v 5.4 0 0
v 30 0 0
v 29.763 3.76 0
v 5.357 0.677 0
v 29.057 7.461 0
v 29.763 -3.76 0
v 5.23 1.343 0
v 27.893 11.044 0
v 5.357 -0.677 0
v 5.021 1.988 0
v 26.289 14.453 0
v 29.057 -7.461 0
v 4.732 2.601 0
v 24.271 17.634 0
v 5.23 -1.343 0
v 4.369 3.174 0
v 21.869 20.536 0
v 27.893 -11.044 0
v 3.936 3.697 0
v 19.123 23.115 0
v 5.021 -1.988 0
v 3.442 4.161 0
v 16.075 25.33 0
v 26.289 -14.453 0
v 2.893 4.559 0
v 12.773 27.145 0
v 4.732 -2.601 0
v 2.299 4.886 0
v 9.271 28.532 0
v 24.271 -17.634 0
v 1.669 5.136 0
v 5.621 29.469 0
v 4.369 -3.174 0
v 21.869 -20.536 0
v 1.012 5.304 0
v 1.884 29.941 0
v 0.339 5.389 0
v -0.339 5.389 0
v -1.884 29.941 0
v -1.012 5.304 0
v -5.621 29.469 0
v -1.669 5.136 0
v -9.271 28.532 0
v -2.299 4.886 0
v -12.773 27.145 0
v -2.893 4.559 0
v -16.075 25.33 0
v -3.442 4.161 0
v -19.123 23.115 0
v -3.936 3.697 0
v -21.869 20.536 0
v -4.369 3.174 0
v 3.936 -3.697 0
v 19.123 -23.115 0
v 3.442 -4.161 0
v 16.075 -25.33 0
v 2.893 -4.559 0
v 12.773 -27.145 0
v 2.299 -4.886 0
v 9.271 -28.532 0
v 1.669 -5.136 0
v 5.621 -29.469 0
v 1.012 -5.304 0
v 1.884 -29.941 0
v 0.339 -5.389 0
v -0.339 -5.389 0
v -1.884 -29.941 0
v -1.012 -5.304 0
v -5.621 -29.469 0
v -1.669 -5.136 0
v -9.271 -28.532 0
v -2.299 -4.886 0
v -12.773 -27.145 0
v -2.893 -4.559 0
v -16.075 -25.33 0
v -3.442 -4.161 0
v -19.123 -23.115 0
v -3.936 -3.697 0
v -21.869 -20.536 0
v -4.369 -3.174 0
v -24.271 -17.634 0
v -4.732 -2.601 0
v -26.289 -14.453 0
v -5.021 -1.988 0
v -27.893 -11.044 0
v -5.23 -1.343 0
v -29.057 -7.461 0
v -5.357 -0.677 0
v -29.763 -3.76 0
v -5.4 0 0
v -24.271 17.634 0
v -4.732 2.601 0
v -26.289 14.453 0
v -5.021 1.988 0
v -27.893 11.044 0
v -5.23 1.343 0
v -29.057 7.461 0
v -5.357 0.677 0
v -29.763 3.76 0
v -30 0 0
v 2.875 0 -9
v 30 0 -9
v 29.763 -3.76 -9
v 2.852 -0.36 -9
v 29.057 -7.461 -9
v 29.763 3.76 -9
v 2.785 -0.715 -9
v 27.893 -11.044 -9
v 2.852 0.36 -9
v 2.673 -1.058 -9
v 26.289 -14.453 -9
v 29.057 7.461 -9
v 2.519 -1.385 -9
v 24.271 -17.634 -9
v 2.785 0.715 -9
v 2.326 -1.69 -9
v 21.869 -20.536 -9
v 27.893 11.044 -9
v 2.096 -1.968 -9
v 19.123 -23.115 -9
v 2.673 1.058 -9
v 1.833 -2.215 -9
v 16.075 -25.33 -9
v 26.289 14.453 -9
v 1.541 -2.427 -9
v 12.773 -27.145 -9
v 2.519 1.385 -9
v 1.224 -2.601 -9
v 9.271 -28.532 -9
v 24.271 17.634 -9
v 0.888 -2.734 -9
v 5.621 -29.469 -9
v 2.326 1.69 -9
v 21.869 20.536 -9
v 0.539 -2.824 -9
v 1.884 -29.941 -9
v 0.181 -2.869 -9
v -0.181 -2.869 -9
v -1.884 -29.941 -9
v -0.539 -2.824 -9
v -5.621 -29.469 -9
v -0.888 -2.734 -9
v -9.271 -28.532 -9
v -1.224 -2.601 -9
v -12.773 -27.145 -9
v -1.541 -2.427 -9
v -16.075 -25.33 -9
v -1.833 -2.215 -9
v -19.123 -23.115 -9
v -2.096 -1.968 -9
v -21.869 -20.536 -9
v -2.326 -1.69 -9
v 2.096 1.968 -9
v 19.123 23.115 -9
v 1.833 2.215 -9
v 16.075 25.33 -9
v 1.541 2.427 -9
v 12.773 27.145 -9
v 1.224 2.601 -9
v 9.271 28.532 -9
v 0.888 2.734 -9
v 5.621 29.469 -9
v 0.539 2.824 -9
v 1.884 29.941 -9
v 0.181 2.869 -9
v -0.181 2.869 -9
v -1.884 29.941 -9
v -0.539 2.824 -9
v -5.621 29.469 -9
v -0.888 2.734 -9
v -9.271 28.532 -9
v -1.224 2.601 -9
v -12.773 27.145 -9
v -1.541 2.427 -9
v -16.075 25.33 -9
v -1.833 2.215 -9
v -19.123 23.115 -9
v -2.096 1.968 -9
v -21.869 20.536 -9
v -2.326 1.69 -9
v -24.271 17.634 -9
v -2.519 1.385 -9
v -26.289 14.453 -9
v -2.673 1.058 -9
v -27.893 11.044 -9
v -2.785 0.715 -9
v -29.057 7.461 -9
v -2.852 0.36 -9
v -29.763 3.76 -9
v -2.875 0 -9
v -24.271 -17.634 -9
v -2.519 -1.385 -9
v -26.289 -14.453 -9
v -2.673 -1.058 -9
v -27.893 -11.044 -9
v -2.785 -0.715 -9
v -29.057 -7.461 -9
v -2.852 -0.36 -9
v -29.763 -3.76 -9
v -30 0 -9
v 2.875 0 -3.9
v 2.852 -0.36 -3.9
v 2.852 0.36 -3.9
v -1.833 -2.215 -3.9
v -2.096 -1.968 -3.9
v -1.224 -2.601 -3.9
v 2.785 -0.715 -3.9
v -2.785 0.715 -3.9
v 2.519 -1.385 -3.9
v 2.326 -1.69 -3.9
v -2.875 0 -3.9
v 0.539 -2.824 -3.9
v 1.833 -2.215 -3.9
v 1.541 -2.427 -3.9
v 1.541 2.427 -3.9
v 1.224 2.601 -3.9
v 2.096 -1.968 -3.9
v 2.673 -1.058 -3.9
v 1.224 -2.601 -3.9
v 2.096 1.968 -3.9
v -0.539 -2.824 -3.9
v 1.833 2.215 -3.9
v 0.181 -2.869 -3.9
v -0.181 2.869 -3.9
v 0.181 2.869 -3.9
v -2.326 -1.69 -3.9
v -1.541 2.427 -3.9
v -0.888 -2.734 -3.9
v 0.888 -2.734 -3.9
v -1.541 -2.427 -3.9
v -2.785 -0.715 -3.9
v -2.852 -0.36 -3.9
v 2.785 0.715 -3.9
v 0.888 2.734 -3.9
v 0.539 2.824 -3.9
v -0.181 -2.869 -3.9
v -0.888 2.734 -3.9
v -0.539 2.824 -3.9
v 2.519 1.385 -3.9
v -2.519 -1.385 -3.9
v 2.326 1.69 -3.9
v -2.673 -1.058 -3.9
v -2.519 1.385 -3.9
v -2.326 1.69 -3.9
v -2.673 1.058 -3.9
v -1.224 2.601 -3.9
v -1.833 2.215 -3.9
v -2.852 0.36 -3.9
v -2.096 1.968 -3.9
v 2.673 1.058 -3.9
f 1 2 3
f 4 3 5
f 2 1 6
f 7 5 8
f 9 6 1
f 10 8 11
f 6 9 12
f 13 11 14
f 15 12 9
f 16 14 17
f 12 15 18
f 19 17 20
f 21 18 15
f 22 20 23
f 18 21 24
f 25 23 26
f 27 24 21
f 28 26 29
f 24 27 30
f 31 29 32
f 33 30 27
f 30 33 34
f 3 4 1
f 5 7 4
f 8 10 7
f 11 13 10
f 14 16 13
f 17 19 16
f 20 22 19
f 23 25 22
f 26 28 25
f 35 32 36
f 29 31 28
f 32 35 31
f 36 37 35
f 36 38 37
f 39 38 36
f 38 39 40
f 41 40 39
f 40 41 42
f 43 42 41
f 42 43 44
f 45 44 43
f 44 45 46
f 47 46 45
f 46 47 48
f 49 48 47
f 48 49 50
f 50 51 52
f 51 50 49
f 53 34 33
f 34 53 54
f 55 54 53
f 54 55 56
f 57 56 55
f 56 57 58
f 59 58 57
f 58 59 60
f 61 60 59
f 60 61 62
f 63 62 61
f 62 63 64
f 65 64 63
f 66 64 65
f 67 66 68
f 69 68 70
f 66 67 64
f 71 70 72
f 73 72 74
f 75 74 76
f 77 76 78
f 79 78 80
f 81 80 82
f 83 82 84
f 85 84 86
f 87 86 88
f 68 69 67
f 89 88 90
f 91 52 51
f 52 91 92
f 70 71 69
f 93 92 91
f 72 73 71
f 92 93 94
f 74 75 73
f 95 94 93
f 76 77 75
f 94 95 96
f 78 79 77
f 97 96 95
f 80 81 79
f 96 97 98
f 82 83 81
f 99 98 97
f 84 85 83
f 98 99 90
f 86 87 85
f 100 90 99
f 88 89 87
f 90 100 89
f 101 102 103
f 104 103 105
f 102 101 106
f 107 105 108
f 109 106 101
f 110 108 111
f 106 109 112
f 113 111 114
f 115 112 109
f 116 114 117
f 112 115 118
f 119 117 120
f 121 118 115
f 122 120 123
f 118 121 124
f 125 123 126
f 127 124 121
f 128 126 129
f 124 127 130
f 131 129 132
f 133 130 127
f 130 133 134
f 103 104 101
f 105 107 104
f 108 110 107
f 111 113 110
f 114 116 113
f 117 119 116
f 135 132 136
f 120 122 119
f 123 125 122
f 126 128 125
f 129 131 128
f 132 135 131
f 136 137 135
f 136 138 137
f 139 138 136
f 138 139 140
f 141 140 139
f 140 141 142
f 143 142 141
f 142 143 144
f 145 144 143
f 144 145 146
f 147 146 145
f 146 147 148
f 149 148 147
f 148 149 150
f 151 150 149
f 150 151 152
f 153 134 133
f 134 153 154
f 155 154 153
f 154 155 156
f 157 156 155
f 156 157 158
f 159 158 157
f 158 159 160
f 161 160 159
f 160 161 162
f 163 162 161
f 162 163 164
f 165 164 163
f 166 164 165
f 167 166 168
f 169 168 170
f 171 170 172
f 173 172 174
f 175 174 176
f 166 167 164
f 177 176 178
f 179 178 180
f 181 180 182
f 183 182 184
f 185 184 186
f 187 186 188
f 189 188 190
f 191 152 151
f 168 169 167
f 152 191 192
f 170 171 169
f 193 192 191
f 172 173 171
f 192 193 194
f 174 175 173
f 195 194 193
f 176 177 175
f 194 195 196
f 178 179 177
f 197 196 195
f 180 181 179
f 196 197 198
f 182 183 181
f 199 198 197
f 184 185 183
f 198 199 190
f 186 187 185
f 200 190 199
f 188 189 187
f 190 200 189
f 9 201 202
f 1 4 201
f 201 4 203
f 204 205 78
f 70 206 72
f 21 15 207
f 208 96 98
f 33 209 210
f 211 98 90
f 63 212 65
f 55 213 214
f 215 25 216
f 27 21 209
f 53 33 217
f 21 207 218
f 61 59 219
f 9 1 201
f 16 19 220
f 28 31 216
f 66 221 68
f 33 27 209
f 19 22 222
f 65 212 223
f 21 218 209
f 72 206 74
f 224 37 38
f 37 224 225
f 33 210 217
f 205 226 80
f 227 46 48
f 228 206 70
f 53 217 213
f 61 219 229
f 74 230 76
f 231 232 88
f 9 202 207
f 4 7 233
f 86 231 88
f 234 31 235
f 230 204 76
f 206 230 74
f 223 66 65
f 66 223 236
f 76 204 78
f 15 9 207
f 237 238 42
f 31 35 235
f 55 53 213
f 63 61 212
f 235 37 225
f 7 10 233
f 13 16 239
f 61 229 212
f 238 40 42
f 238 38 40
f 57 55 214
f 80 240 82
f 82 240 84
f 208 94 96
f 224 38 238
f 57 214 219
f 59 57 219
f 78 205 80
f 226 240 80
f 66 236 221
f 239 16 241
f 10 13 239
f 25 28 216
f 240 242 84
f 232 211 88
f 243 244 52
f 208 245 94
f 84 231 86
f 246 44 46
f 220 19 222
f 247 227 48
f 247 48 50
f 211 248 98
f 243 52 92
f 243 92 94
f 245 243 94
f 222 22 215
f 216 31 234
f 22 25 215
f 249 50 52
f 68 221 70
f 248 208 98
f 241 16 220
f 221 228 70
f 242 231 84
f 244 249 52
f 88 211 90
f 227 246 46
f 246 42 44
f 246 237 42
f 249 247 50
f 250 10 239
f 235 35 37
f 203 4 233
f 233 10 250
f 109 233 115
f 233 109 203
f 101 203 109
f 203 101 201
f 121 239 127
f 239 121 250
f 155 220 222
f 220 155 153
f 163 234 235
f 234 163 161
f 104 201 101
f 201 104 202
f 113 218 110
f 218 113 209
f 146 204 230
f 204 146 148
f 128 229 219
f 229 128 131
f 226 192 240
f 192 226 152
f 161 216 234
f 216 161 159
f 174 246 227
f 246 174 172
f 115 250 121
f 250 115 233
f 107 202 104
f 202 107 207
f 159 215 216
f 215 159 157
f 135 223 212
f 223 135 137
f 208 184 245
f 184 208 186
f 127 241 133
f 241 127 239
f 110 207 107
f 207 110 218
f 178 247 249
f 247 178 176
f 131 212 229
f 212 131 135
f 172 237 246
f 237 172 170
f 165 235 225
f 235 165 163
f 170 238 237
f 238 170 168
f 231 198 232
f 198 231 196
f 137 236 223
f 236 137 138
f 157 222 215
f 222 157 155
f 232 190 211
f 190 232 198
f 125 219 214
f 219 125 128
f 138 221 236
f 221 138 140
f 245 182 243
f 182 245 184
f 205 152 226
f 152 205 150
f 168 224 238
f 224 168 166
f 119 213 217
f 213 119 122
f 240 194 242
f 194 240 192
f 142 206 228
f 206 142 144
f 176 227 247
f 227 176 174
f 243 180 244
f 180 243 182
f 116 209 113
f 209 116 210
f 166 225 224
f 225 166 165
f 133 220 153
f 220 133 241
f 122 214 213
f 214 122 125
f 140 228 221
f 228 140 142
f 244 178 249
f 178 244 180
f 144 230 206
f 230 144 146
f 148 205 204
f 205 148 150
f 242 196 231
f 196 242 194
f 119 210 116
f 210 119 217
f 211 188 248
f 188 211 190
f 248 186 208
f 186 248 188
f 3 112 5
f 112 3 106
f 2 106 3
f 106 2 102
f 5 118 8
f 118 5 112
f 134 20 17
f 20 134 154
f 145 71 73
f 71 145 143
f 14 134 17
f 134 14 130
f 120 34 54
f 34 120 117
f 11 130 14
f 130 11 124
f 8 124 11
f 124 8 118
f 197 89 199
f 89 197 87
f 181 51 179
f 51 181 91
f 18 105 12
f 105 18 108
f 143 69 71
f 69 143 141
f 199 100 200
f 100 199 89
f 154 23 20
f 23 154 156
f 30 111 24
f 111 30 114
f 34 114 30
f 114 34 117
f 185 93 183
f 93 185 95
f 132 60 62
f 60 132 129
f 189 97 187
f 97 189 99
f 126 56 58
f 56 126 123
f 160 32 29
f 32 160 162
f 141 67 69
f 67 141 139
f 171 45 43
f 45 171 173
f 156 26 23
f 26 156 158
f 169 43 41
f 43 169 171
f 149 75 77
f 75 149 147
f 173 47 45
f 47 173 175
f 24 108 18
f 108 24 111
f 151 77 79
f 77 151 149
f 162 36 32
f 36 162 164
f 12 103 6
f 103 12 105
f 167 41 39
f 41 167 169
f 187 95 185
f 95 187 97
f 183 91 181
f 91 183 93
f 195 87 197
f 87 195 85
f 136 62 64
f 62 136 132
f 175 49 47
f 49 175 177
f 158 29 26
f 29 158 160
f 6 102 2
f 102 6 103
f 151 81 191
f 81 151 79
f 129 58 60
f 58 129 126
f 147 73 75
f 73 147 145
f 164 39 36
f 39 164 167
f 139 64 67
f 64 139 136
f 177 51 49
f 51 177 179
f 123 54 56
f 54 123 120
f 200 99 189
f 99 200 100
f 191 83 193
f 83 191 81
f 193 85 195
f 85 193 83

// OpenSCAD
$fn = 50;


difference() {
	union() {
		translate(v = [0, 0, -9.0000000000]) {
			cylinder(h = 9, r = 30.0000000000);
		}
	}
	union() {
		translate(v = [0, 0, 0]) {
			rotate(a = [0, 0, 0]) {
				difference() {
					union() {
						#translate(v = [0, 0, -9.0000000000]) {
							cylinder(h = 9, r = 2.6000000000);
						}
						#translate(v = [0, 0, -3.9000000000]) {
							cylinder(h = 3.9000000000, r1 = 2.8750000000, r2 = 5.4000000000);
						}
						#translate(v = [0, 0, -9.0000000000]) {
							cylinder(h = 9, r = 2.8750000000);
						}
						#translate(v = [0, 0, -9.0000000000]) {
							cylinder(h = 9, r = 2.6000000000);
						}
					}
					union();
				}
			}
		}
	}
}
